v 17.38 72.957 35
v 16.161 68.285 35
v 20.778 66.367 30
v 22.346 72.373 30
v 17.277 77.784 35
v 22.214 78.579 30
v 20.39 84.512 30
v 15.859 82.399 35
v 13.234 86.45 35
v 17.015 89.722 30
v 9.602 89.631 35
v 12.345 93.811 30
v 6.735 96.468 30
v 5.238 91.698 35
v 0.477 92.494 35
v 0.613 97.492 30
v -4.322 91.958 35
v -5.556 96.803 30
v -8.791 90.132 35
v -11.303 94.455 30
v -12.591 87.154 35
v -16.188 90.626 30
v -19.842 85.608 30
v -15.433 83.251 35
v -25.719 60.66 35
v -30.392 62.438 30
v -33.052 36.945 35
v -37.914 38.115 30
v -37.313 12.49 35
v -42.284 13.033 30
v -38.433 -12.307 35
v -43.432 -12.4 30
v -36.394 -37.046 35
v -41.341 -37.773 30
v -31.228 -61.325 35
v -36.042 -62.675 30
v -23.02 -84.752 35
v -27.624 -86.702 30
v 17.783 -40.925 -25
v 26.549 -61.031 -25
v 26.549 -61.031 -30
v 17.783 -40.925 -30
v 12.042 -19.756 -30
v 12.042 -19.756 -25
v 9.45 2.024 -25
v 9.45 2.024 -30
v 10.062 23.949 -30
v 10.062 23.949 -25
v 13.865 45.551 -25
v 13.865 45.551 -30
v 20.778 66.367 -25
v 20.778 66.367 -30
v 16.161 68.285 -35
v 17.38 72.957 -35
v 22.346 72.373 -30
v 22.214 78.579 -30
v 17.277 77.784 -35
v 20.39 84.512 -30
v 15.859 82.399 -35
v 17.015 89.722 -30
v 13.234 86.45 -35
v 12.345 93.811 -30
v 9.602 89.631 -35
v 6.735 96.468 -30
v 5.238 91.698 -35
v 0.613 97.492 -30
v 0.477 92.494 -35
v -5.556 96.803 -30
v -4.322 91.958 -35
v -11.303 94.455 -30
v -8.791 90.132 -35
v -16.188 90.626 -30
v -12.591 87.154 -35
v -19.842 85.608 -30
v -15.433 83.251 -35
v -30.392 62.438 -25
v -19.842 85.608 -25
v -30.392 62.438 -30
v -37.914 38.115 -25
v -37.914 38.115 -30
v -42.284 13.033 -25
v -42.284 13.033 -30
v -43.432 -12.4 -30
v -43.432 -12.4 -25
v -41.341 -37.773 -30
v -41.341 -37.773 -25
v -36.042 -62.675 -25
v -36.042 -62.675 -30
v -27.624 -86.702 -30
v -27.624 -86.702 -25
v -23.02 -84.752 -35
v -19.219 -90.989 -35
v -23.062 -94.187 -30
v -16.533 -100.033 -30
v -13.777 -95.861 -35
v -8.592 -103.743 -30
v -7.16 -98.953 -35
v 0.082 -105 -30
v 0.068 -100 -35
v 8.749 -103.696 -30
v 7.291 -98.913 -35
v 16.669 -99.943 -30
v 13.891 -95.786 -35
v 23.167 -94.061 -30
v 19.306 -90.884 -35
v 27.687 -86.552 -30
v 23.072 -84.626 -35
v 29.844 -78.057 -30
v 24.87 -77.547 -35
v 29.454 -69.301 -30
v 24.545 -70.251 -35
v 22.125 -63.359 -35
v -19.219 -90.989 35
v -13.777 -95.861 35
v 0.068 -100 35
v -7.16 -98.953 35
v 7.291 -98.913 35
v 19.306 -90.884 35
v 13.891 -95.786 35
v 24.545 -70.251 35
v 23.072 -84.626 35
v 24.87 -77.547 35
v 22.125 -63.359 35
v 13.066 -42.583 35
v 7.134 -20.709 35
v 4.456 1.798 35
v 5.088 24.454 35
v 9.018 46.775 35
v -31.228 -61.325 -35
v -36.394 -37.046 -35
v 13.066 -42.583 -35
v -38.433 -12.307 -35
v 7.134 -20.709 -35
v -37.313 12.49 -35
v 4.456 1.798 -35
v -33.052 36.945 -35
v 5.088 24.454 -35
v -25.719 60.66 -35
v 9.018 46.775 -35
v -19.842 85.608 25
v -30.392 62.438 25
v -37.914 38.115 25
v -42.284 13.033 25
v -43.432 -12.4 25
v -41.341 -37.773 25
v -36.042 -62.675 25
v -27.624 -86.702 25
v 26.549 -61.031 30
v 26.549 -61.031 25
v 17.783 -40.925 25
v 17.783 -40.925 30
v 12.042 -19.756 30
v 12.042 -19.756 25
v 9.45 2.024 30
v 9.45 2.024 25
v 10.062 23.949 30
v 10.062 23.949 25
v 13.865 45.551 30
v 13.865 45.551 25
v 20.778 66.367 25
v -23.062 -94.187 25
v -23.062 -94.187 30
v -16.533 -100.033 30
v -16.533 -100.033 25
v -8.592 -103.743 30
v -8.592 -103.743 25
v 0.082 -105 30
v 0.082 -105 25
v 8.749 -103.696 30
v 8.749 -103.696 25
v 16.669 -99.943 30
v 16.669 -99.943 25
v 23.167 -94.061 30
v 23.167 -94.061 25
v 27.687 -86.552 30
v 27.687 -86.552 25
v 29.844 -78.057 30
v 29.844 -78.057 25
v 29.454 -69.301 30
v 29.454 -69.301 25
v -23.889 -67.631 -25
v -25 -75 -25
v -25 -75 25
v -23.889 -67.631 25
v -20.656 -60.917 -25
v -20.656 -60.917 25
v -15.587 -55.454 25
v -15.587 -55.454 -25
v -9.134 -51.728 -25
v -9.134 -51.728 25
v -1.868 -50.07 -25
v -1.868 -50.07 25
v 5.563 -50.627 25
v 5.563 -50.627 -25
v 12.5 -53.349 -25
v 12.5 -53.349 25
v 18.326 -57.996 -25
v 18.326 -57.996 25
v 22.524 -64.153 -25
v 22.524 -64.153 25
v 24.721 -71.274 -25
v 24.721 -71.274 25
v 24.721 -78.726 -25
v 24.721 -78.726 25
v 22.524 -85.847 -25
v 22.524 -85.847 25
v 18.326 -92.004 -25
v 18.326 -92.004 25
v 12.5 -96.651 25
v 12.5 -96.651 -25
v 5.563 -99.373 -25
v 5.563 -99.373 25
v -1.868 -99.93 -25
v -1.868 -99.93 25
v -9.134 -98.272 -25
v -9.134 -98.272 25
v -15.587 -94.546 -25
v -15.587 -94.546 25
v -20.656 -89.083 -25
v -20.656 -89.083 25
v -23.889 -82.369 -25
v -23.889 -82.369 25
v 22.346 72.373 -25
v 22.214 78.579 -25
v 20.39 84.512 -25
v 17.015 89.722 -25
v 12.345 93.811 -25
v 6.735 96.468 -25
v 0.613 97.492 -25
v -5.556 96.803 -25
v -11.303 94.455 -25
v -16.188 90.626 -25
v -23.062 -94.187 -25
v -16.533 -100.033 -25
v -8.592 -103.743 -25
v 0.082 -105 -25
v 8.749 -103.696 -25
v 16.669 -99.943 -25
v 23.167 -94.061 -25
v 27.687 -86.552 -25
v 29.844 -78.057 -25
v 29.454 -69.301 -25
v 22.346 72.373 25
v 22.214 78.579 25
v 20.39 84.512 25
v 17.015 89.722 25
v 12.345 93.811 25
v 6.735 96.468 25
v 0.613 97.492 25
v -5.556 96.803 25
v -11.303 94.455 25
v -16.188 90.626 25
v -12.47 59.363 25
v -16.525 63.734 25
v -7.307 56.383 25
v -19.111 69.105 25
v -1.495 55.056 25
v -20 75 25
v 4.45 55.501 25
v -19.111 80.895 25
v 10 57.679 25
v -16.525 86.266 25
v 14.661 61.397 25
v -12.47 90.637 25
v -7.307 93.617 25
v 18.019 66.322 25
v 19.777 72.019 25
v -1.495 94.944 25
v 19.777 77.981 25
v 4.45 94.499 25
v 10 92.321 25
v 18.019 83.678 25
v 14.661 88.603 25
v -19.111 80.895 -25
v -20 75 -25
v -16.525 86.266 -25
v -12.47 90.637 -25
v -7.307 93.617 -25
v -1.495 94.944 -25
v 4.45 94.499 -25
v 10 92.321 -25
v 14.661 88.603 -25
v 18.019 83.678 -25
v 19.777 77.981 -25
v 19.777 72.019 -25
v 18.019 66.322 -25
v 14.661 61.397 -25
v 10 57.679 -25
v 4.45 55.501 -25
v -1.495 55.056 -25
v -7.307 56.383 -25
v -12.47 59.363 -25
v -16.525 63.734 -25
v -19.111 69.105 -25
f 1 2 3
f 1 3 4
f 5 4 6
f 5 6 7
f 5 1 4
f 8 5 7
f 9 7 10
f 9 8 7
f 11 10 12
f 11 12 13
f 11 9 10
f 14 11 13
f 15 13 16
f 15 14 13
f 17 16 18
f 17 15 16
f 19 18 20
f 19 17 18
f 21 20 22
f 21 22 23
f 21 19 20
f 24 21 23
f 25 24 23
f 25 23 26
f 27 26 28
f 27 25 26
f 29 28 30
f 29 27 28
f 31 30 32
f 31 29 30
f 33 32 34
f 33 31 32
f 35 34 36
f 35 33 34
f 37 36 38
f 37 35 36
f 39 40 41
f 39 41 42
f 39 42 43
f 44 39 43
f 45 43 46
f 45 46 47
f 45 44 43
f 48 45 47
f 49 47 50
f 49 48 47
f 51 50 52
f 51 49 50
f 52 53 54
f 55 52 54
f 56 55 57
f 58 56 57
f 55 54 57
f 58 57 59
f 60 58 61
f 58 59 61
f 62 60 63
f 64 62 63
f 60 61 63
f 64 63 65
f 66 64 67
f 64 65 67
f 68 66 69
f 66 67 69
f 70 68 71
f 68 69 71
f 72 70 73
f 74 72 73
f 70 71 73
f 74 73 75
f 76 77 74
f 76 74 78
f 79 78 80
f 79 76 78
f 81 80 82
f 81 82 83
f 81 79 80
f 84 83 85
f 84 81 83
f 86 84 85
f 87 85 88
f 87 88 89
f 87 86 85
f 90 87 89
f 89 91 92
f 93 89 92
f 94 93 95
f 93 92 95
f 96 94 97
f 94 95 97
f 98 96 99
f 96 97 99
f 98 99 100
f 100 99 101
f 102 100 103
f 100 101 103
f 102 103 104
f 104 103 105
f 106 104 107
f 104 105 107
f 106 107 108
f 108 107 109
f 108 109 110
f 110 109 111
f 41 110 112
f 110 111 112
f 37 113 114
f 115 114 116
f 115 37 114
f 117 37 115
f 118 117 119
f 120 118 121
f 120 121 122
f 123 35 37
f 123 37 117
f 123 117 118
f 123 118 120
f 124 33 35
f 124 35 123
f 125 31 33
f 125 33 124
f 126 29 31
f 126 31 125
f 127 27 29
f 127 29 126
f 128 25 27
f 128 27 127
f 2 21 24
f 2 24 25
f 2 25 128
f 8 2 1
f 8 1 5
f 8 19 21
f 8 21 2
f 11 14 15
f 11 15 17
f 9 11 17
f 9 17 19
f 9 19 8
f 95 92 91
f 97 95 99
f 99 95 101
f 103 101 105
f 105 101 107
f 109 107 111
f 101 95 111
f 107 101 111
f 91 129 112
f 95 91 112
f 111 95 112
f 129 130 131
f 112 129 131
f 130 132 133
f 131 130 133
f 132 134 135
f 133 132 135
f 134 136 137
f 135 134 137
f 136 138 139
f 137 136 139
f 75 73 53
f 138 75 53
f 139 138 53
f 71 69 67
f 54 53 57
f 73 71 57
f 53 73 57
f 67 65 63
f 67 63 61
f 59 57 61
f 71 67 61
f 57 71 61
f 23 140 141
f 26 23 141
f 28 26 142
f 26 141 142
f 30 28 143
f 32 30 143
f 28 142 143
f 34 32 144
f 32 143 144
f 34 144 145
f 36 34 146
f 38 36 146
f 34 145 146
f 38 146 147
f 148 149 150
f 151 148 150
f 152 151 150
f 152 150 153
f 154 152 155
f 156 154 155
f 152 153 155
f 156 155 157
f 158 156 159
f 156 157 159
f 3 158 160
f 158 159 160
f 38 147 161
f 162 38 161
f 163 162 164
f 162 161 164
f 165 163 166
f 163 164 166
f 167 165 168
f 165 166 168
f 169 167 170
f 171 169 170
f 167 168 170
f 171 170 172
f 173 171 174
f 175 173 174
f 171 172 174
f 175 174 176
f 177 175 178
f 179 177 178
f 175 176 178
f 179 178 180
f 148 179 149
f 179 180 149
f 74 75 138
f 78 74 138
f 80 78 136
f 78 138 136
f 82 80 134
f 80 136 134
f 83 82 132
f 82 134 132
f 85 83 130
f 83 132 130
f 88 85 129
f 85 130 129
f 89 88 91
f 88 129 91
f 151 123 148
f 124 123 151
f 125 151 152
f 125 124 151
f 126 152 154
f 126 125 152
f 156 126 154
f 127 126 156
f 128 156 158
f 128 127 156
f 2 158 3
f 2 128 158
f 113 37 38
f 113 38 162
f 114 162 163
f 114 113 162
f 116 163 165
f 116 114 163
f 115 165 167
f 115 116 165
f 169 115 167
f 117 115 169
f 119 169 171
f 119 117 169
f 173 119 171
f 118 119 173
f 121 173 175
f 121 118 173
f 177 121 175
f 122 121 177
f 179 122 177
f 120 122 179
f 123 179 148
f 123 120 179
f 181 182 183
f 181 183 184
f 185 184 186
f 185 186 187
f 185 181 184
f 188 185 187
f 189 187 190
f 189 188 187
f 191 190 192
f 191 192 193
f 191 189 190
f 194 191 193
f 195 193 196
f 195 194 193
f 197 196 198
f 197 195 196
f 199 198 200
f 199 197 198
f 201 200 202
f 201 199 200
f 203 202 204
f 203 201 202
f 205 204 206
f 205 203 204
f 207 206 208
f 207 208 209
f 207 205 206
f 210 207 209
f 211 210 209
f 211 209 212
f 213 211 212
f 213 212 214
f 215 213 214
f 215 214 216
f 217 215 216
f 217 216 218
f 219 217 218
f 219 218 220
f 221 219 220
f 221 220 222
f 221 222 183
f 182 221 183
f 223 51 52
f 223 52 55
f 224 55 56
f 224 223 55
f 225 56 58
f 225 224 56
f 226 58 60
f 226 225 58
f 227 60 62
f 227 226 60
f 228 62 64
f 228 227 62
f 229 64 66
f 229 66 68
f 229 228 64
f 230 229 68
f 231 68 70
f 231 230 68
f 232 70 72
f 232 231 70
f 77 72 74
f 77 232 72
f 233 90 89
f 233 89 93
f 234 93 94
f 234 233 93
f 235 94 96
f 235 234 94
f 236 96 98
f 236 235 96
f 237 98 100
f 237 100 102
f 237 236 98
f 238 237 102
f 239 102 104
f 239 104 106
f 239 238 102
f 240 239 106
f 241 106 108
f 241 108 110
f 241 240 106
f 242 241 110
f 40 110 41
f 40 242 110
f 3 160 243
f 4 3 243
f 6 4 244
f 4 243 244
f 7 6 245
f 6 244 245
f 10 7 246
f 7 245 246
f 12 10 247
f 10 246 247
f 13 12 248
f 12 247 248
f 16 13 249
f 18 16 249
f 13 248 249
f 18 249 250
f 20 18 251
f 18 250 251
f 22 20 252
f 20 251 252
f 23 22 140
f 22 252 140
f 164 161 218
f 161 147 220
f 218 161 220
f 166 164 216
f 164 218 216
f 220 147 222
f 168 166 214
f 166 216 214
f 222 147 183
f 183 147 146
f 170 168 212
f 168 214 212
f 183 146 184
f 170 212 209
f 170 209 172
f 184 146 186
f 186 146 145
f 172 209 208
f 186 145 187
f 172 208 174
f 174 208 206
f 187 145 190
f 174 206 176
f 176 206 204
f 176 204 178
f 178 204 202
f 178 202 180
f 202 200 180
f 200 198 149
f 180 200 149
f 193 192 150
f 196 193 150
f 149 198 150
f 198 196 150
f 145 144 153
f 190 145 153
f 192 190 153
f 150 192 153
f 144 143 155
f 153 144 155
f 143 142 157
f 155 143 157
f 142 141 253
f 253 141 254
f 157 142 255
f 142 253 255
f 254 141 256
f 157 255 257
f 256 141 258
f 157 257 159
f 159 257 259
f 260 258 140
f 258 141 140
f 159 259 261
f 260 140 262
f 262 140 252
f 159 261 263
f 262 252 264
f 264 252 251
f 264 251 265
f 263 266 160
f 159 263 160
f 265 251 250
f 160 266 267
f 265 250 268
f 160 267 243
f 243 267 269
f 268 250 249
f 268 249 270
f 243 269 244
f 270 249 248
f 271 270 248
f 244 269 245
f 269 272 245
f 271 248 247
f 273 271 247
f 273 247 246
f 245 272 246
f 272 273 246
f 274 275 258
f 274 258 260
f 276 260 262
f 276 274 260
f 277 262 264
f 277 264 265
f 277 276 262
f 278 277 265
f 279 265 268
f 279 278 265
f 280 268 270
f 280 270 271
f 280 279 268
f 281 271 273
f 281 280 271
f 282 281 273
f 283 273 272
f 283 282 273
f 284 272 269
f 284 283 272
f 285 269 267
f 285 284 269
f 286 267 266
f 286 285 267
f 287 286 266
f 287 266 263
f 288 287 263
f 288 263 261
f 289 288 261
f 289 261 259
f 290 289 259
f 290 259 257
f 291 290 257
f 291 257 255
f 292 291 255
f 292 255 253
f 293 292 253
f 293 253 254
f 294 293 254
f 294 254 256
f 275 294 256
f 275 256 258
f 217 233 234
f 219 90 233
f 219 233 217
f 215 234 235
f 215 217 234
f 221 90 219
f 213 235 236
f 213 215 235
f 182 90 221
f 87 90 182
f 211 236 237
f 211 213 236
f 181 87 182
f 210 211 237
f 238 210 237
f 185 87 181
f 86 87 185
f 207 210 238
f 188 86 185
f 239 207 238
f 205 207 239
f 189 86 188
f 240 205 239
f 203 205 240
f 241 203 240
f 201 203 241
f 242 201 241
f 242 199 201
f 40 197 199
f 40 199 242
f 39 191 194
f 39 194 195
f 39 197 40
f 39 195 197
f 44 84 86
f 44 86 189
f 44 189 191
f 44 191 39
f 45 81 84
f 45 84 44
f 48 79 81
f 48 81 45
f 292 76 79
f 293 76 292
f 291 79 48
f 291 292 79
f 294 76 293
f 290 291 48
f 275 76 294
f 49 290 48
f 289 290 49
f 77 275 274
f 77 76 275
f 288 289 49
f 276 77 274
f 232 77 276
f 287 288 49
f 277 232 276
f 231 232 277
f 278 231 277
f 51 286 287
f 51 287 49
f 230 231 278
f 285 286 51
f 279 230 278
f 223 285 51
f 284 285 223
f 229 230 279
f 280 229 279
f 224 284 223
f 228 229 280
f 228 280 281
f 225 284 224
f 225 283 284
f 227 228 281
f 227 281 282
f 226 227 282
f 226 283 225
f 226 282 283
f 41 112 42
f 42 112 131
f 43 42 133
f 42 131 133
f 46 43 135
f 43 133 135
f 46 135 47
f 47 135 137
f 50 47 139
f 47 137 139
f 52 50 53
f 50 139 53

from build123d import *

# Parameters (mm, degrees)
BOSS_EXTRUDE1_DEPTH = 10
CHAMFER2_SIZE       = 5
SKETCH4_R           = 20
SKETCH4_R_2         = 25
BOSS_EXTRUDE2_DEPTH = 30


with BuildPart() as part:
    # Sketch2 → Boss-Extrude1 (new body)
    with BuildSketch(Plane.XY.offset(25)):
        with BuildLine():
            ThreePointArc((20.777841167, 66.366847826), (9.632079925, 95.3340364), (-19.842240524, 85.608274648))
            ThreePointArc((-19.842240524, 85.608274648), (-43.263152194, 0.334990999), (-27.623511317, -86.702205882))
            ThreePointArc((-27.623511317, -86.702205882), (12.846707304, -102.110184644), (26.549463713, -61.03125))
            ThreePointArc((26.549463713, -61.03125), (9.450478546, 2.023887612), (20.777841167, 66.366847826))
        make_face()
    extrude(amount=BOSS_EXTRUDE1_DEPTH)

    # Chamfer2
    chamfer2_edges = [part.edges().sort_by_distance(p)[0] for p in [
        (9.450478546, 2.023887612, 35),
        (9.632079925, 95.3340364, 35),
        (-43.263152194, 0.334990999, 35),
        (12.846707304, -102.110184644, 35),
    ]]
    chamfer(chamfer2_edges, length=CHAMFER2_SIZE)

    # Sketch4 → Boss-Extrude2 (add)
    with BuildSketch(Plane(origin=(0, 0, 25), x_dir=(-1, 0, 0), z_dir=(0, 0, -1))):
        with Locations((0, 75)):
            Circle(SKETCH4_R)
        with Locations((0, -75)):
            Circle(SKETCH4_R_2)
    extrude(amount=BOSS_EXTRUDE2_DEPTH)

    # Mirror3: part across plane


with BuildPart() as part_1:
    add(part.part)
    add(part.part.mirror(Plane.XY))


solid = part_1.part
